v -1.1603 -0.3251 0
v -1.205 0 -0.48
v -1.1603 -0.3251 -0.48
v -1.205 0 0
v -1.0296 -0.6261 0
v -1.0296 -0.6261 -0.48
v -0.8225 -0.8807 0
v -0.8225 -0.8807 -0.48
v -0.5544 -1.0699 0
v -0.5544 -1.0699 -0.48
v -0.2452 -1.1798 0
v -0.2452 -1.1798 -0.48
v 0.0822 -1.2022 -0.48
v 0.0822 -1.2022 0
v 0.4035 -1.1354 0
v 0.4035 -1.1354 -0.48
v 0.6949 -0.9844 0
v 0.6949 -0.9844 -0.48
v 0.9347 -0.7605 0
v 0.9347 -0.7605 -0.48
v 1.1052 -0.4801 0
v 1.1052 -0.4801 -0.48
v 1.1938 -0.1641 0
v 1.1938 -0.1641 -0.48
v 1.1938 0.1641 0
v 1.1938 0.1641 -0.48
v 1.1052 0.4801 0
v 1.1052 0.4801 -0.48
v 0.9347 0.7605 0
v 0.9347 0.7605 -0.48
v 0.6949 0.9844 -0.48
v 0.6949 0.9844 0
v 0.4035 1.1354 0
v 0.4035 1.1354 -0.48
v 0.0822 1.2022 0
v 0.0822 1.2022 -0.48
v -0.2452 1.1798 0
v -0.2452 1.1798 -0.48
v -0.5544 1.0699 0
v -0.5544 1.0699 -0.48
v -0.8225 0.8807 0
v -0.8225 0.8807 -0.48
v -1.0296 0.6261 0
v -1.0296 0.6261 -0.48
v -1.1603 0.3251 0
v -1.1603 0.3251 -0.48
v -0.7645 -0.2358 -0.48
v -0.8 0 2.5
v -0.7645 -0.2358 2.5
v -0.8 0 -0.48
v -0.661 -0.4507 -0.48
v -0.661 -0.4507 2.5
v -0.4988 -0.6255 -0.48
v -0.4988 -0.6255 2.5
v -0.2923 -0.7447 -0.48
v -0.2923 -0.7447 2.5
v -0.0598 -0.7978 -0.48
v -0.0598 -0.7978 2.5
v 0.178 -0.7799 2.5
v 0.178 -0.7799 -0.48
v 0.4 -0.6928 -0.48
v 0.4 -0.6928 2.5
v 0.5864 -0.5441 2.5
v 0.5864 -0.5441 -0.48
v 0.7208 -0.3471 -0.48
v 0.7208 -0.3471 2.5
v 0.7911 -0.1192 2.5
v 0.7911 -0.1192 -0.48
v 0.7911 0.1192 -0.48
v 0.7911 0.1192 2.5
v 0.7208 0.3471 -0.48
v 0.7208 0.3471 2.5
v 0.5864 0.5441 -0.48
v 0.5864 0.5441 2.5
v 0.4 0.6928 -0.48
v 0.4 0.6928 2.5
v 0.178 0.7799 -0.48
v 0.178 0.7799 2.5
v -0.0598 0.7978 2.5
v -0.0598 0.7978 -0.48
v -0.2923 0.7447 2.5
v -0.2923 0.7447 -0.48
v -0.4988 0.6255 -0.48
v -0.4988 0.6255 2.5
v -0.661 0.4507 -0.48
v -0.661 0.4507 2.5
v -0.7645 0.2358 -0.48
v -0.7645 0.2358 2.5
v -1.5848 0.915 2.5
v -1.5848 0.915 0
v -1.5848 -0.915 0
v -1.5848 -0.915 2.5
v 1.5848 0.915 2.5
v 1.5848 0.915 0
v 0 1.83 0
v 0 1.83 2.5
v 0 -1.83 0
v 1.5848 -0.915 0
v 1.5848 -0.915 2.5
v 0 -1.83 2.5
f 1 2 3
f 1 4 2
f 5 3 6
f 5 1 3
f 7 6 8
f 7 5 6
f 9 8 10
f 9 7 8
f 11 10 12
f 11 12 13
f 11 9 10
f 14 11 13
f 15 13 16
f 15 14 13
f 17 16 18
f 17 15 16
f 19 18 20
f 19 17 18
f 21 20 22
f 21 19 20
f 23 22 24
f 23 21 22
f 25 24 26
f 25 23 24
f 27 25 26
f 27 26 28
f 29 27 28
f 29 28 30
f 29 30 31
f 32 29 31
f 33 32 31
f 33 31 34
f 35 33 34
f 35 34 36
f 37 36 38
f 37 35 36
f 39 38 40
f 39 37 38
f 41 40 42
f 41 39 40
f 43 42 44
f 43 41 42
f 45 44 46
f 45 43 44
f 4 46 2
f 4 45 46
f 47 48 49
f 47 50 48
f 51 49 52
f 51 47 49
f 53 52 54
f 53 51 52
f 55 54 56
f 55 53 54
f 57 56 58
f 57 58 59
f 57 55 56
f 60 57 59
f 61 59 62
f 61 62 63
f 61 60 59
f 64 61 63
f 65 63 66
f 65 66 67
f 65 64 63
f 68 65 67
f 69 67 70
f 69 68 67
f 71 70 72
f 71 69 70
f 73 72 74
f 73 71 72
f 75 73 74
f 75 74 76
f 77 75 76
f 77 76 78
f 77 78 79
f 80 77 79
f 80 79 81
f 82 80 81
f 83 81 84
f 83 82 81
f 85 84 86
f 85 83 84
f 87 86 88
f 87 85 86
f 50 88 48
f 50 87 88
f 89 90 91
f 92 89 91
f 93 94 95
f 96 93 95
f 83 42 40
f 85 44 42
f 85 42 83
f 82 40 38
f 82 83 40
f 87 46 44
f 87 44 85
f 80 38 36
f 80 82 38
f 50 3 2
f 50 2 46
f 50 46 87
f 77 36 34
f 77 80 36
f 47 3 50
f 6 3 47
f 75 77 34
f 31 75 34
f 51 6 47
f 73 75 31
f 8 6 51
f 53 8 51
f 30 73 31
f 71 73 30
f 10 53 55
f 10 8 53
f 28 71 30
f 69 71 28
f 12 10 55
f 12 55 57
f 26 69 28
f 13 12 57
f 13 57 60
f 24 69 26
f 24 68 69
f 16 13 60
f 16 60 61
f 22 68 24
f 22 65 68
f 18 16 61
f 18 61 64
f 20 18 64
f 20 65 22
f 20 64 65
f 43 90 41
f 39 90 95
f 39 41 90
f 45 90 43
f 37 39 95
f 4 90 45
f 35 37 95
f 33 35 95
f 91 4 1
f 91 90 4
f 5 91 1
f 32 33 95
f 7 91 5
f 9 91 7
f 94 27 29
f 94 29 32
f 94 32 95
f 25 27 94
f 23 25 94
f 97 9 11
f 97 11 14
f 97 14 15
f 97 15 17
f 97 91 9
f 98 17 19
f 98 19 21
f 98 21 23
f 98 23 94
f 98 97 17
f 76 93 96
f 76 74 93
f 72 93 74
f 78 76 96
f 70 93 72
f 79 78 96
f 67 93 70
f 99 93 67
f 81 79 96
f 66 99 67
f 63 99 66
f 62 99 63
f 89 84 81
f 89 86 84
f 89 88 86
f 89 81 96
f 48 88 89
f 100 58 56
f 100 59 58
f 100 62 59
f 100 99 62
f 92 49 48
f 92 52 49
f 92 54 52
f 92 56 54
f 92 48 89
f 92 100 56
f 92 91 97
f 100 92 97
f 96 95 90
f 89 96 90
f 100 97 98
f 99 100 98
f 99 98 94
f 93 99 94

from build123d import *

# Parameters (mm, degrees)
SKETCH001_R       = 3
POCKET_DEPTH      = 0.481
POCKET_DEPTH_BACK = -2.501


with BuildPart() as part:
    # Sketch → Revolution (revolve)
    with BuildSketch(Plane.XZ):
        Polygon((-0.8, 2.5), (-0.8, -0.48), (-1.205, -0.48), (-1.205, 0), (-1.83, 0), (-1.83, 2.5), align=None)
    revolve(axis=Axis((0, 0, 0), (0, 0, 1)))

    # Sketch001 → Pocket (cut, two sides)
    with BuildSketch(Plane.XY) as pocket_sk:
        Circle(SKETCH001_R)
        Polygon((0, 1.83), (-1.584826, 0.915), (-1.584826, -0.915), (0, -1.83), (1.584826, -0.915), (1.584826, 0.915), align=None, mode=Mode.SUBTRACT)
    extrude(amount=-POCKET_DEPTH, mode=Mode.SUBTRACT)
    extrude(pocket_sk.sketch, amount=-POCKET_DEPTH_BACK, mode=Mode.SUBTRACT)


solid = part.part
